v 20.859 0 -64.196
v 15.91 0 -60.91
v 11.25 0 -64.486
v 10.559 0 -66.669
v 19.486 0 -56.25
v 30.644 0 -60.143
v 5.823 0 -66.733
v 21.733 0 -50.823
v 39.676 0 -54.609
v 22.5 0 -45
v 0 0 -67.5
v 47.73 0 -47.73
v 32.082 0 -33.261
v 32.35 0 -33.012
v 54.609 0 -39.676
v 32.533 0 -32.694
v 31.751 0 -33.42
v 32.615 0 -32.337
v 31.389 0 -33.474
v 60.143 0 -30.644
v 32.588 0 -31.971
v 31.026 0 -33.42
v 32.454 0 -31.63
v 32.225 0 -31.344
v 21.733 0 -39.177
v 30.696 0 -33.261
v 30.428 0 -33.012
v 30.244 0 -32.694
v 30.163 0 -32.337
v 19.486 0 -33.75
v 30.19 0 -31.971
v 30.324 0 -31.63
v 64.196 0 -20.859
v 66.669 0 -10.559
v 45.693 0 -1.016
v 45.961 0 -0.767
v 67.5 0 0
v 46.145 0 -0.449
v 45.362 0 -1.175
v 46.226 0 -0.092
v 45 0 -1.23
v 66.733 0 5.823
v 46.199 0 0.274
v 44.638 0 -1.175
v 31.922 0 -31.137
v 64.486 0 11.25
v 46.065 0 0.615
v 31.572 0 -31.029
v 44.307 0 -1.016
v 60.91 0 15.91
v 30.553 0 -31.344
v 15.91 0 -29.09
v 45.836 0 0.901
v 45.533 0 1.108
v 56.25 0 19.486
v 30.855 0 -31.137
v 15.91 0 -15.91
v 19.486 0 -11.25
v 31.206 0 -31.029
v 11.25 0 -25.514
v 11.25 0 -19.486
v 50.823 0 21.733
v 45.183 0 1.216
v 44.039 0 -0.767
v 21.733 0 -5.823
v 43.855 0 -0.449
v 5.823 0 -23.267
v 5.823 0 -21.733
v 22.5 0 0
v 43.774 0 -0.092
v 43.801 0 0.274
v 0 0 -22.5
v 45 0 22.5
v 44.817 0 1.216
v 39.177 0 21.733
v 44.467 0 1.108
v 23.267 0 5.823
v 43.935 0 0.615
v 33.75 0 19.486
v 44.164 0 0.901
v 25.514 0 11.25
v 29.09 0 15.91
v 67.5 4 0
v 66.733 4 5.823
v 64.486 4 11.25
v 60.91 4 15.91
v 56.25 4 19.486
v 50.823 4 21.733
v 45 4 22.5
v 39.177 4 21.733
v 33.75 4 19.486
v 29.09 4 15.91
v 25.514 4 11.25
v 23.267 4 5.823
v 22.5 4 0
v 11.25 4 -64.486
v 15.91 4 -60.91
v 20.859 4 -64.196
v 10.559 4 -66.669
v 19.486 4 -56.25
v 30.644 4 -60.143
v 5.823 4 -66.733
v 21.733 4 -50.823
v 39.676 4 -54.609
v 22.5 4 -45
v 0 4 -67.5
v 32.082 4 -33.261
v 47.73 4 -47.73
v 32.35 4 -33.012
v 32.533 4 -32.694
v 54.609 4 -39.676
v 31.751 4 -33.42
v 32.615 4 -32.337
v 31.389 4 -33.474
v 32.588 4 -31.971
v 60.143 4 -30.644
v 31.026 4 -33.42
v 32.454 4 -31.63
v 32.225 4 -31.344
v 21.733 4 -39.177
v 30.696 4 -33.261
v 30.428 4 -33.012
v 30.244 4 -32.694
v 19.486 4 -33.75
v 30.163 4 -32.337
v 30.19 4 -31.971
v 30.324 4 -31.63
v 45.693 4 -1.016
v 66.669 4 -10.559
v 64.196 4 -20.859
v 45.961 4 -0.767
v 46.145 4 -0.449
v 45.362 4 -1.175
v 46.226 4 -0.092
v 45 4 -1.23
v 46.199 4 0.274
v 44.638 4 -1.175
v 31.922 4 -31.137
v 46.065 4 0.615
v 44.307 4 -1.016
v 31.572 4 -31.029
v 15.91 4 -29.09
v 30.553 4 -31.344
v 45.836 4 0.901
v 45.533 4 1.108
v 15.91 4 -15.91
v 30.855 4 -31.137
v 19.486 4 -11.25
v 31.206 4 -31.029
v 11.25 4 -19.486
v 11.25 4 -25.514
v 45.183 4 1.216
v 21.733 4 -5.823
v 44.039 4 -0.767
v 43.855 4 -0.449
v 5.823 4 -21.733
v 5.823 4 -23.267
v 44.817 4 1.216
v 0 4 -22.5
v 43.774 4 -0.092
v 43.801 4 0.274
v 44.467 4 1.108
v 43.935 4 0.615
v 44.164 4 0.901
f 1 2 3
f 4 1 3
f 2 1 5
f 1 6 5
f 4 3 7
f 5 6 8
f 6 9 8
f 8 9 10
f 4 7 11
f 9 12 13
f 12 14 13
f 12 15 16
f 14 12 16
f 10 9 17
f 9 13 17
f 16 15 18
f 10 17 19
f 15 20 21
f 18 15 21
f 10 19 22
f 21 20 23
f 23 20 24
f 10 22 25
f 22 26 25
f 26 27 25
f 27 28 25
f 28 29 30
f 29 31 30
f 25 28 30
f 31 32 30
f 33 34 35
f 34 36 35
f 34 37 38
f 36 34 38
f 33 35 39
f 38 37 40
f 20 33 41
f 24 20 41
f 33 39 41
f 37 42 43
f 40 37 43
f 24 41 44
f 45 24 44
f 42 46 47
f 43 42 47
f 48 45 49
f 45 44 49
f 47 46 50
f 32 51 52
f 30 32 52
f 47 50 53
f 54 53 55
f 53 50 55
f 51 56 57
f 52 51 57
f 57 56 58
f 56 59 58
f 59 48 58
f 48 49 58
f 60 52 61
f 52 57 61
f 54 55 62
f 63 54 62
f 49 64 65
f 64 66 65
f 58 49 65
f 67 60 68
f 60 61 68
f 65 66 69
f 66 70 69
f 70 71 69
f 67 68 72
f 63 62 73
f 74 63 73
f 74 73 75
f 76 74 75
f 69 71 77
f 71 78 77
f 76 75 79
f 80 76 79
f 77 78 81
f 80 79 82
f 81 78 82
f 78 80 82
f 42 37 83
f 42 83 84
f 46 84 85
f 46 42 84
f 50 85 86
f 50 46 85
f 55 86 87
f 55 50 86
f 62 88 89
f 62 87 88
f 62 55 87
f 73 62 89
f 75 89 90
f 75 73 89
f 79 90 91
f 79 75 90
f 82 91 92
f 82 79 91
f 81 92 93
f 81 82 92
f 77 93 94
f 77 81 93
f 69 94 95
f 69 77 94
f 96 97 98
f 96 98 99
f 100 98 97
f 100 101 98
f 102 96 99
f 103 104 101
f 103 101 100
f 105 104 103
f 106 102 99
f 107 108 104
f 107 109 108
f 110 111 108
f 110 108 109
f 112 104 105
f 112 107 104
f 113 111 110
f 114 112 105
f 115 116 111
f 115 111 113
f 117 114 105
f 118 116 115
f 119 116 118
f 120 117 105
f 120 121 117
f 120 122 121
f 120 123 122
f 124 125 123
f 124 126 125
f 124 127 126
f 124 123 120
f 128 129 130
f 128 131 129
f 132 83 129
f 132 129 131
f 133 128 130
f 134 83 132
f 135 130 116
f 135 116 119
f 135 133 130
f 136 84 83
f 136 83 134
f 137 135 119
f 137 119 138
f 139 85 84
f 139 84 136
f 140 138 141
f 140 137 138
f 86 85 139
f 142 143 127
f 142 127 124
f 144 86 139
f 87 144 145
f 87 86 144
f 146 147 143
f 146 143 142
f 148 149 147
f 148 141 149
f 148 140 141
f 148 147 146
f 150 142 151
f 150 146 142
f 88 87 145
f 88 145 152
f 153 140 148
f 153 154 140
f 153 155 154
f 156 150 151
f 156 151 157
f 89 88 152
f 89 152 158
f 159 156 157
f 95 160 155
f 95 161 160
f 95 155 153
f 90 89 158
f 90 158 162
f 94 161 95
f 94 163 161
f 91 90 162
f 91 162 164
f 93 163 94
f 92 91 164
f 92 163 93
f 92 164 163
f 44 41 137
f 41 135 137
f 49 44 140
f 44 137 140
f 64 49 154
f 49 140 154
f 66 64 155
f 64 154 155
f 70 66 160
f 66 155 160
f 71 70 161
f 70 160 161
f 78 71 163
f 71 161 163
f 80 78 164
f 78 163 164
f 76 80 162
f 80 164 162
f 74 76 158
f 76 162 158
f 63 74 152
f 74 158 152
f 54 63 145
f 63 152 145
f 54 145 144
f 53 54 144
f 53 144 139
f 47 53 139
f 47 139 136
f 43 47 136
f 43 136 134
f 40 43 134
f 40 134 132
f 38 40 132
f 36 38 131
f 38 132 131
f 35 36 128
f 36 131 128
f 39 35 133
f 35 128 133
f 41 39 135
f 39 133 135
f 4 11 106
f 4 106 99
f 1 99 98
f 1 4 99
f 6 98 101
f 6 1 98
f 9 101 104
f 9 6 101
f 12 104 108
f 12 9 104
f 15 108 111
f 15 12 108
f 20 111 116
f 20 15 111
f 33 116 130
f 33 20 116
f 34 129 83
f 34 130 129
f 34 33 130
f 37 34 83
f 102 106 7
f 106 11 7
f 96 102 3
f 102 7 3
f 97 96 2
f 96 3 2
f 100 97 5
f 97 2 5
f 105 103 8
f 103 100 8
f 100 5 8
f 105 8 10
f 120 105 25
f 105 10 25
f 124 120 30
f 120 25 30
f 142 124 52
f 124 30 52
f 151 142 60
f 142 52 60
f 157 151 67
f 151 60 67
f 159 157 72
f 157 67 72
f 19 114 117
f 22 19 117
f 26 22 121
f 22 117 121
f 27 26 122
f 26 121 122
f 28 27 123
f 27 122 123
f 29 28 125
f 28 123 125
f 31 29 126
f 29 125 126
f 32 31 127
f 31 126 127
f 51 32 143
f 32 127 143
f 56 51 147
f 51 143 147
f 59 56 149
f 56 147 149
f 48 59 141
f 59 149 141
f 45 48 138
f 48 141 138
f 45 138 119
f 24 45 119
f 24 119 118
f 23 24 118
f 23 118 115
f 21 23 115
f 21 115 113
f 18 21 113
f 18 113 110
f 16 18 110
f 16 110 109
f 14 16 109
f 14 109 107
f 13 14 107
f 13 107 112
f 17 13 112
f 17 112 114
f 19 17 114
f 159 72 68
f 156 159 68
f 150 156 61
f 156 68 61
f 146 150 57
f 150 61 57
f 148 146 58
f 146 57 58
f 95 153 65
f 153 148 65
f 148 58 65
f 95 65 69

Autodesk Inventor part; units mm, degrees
ref_plane "YZ Plane" through (0, 0, 0) normal (1, 0, 0) x (0, 1, 0)
ref_plane "XZ Plane" through (0, 0, 0) normal (0, 1, 0) x (-1, 0, 0)
ref_plane "XY Plane" through (0, 0, 0) normal (0, 0, 1) x (1, 0, 0)
sketch "草圖1" plane through (0, 0, 0) normal (0, 1, 0) x (-1, 0, 0)
  arc A0 (-45, 0) -> (0, -45) centre (0, 0) ccw construction
  arc A1 (-67.5, 0) -> (0, -67.5) centre (0, 0) ccw
  arc A2 (-22.5, 0) -> (0, -22.5) centre (0, 0) ccw
  arc A3 (-22.5, 0) -> (-67.5, 0) centre (-45, 0) ccw
  arc A4 (0, -22.5) -> (0, -67.5) centre (0, -45) ccw
  dimension "d1" = 45
  dimension "d3" = 22.5
extrude "擠出1" add sketch "草圖1" along normal blind 4
sketch "草圖3" plane through (0, 0, 0) normal (0, -1, 0) x (1, 0, 0)
  arc A0 (0, -45) -> (45, 0) centre (0, 0) ccw construction
  line L0 (45, 0) -> (31.3889, -32.245)
  dimension "d7" = 35
hole "孔1" at (45, 0, 0) at (31.3889, 0, -32.245) direction (0, 1, 0) diameter 2.459 end through all thread size "M3x0.5" class "6H" standard "ISO Metric profile"
properties part number "A0004"
